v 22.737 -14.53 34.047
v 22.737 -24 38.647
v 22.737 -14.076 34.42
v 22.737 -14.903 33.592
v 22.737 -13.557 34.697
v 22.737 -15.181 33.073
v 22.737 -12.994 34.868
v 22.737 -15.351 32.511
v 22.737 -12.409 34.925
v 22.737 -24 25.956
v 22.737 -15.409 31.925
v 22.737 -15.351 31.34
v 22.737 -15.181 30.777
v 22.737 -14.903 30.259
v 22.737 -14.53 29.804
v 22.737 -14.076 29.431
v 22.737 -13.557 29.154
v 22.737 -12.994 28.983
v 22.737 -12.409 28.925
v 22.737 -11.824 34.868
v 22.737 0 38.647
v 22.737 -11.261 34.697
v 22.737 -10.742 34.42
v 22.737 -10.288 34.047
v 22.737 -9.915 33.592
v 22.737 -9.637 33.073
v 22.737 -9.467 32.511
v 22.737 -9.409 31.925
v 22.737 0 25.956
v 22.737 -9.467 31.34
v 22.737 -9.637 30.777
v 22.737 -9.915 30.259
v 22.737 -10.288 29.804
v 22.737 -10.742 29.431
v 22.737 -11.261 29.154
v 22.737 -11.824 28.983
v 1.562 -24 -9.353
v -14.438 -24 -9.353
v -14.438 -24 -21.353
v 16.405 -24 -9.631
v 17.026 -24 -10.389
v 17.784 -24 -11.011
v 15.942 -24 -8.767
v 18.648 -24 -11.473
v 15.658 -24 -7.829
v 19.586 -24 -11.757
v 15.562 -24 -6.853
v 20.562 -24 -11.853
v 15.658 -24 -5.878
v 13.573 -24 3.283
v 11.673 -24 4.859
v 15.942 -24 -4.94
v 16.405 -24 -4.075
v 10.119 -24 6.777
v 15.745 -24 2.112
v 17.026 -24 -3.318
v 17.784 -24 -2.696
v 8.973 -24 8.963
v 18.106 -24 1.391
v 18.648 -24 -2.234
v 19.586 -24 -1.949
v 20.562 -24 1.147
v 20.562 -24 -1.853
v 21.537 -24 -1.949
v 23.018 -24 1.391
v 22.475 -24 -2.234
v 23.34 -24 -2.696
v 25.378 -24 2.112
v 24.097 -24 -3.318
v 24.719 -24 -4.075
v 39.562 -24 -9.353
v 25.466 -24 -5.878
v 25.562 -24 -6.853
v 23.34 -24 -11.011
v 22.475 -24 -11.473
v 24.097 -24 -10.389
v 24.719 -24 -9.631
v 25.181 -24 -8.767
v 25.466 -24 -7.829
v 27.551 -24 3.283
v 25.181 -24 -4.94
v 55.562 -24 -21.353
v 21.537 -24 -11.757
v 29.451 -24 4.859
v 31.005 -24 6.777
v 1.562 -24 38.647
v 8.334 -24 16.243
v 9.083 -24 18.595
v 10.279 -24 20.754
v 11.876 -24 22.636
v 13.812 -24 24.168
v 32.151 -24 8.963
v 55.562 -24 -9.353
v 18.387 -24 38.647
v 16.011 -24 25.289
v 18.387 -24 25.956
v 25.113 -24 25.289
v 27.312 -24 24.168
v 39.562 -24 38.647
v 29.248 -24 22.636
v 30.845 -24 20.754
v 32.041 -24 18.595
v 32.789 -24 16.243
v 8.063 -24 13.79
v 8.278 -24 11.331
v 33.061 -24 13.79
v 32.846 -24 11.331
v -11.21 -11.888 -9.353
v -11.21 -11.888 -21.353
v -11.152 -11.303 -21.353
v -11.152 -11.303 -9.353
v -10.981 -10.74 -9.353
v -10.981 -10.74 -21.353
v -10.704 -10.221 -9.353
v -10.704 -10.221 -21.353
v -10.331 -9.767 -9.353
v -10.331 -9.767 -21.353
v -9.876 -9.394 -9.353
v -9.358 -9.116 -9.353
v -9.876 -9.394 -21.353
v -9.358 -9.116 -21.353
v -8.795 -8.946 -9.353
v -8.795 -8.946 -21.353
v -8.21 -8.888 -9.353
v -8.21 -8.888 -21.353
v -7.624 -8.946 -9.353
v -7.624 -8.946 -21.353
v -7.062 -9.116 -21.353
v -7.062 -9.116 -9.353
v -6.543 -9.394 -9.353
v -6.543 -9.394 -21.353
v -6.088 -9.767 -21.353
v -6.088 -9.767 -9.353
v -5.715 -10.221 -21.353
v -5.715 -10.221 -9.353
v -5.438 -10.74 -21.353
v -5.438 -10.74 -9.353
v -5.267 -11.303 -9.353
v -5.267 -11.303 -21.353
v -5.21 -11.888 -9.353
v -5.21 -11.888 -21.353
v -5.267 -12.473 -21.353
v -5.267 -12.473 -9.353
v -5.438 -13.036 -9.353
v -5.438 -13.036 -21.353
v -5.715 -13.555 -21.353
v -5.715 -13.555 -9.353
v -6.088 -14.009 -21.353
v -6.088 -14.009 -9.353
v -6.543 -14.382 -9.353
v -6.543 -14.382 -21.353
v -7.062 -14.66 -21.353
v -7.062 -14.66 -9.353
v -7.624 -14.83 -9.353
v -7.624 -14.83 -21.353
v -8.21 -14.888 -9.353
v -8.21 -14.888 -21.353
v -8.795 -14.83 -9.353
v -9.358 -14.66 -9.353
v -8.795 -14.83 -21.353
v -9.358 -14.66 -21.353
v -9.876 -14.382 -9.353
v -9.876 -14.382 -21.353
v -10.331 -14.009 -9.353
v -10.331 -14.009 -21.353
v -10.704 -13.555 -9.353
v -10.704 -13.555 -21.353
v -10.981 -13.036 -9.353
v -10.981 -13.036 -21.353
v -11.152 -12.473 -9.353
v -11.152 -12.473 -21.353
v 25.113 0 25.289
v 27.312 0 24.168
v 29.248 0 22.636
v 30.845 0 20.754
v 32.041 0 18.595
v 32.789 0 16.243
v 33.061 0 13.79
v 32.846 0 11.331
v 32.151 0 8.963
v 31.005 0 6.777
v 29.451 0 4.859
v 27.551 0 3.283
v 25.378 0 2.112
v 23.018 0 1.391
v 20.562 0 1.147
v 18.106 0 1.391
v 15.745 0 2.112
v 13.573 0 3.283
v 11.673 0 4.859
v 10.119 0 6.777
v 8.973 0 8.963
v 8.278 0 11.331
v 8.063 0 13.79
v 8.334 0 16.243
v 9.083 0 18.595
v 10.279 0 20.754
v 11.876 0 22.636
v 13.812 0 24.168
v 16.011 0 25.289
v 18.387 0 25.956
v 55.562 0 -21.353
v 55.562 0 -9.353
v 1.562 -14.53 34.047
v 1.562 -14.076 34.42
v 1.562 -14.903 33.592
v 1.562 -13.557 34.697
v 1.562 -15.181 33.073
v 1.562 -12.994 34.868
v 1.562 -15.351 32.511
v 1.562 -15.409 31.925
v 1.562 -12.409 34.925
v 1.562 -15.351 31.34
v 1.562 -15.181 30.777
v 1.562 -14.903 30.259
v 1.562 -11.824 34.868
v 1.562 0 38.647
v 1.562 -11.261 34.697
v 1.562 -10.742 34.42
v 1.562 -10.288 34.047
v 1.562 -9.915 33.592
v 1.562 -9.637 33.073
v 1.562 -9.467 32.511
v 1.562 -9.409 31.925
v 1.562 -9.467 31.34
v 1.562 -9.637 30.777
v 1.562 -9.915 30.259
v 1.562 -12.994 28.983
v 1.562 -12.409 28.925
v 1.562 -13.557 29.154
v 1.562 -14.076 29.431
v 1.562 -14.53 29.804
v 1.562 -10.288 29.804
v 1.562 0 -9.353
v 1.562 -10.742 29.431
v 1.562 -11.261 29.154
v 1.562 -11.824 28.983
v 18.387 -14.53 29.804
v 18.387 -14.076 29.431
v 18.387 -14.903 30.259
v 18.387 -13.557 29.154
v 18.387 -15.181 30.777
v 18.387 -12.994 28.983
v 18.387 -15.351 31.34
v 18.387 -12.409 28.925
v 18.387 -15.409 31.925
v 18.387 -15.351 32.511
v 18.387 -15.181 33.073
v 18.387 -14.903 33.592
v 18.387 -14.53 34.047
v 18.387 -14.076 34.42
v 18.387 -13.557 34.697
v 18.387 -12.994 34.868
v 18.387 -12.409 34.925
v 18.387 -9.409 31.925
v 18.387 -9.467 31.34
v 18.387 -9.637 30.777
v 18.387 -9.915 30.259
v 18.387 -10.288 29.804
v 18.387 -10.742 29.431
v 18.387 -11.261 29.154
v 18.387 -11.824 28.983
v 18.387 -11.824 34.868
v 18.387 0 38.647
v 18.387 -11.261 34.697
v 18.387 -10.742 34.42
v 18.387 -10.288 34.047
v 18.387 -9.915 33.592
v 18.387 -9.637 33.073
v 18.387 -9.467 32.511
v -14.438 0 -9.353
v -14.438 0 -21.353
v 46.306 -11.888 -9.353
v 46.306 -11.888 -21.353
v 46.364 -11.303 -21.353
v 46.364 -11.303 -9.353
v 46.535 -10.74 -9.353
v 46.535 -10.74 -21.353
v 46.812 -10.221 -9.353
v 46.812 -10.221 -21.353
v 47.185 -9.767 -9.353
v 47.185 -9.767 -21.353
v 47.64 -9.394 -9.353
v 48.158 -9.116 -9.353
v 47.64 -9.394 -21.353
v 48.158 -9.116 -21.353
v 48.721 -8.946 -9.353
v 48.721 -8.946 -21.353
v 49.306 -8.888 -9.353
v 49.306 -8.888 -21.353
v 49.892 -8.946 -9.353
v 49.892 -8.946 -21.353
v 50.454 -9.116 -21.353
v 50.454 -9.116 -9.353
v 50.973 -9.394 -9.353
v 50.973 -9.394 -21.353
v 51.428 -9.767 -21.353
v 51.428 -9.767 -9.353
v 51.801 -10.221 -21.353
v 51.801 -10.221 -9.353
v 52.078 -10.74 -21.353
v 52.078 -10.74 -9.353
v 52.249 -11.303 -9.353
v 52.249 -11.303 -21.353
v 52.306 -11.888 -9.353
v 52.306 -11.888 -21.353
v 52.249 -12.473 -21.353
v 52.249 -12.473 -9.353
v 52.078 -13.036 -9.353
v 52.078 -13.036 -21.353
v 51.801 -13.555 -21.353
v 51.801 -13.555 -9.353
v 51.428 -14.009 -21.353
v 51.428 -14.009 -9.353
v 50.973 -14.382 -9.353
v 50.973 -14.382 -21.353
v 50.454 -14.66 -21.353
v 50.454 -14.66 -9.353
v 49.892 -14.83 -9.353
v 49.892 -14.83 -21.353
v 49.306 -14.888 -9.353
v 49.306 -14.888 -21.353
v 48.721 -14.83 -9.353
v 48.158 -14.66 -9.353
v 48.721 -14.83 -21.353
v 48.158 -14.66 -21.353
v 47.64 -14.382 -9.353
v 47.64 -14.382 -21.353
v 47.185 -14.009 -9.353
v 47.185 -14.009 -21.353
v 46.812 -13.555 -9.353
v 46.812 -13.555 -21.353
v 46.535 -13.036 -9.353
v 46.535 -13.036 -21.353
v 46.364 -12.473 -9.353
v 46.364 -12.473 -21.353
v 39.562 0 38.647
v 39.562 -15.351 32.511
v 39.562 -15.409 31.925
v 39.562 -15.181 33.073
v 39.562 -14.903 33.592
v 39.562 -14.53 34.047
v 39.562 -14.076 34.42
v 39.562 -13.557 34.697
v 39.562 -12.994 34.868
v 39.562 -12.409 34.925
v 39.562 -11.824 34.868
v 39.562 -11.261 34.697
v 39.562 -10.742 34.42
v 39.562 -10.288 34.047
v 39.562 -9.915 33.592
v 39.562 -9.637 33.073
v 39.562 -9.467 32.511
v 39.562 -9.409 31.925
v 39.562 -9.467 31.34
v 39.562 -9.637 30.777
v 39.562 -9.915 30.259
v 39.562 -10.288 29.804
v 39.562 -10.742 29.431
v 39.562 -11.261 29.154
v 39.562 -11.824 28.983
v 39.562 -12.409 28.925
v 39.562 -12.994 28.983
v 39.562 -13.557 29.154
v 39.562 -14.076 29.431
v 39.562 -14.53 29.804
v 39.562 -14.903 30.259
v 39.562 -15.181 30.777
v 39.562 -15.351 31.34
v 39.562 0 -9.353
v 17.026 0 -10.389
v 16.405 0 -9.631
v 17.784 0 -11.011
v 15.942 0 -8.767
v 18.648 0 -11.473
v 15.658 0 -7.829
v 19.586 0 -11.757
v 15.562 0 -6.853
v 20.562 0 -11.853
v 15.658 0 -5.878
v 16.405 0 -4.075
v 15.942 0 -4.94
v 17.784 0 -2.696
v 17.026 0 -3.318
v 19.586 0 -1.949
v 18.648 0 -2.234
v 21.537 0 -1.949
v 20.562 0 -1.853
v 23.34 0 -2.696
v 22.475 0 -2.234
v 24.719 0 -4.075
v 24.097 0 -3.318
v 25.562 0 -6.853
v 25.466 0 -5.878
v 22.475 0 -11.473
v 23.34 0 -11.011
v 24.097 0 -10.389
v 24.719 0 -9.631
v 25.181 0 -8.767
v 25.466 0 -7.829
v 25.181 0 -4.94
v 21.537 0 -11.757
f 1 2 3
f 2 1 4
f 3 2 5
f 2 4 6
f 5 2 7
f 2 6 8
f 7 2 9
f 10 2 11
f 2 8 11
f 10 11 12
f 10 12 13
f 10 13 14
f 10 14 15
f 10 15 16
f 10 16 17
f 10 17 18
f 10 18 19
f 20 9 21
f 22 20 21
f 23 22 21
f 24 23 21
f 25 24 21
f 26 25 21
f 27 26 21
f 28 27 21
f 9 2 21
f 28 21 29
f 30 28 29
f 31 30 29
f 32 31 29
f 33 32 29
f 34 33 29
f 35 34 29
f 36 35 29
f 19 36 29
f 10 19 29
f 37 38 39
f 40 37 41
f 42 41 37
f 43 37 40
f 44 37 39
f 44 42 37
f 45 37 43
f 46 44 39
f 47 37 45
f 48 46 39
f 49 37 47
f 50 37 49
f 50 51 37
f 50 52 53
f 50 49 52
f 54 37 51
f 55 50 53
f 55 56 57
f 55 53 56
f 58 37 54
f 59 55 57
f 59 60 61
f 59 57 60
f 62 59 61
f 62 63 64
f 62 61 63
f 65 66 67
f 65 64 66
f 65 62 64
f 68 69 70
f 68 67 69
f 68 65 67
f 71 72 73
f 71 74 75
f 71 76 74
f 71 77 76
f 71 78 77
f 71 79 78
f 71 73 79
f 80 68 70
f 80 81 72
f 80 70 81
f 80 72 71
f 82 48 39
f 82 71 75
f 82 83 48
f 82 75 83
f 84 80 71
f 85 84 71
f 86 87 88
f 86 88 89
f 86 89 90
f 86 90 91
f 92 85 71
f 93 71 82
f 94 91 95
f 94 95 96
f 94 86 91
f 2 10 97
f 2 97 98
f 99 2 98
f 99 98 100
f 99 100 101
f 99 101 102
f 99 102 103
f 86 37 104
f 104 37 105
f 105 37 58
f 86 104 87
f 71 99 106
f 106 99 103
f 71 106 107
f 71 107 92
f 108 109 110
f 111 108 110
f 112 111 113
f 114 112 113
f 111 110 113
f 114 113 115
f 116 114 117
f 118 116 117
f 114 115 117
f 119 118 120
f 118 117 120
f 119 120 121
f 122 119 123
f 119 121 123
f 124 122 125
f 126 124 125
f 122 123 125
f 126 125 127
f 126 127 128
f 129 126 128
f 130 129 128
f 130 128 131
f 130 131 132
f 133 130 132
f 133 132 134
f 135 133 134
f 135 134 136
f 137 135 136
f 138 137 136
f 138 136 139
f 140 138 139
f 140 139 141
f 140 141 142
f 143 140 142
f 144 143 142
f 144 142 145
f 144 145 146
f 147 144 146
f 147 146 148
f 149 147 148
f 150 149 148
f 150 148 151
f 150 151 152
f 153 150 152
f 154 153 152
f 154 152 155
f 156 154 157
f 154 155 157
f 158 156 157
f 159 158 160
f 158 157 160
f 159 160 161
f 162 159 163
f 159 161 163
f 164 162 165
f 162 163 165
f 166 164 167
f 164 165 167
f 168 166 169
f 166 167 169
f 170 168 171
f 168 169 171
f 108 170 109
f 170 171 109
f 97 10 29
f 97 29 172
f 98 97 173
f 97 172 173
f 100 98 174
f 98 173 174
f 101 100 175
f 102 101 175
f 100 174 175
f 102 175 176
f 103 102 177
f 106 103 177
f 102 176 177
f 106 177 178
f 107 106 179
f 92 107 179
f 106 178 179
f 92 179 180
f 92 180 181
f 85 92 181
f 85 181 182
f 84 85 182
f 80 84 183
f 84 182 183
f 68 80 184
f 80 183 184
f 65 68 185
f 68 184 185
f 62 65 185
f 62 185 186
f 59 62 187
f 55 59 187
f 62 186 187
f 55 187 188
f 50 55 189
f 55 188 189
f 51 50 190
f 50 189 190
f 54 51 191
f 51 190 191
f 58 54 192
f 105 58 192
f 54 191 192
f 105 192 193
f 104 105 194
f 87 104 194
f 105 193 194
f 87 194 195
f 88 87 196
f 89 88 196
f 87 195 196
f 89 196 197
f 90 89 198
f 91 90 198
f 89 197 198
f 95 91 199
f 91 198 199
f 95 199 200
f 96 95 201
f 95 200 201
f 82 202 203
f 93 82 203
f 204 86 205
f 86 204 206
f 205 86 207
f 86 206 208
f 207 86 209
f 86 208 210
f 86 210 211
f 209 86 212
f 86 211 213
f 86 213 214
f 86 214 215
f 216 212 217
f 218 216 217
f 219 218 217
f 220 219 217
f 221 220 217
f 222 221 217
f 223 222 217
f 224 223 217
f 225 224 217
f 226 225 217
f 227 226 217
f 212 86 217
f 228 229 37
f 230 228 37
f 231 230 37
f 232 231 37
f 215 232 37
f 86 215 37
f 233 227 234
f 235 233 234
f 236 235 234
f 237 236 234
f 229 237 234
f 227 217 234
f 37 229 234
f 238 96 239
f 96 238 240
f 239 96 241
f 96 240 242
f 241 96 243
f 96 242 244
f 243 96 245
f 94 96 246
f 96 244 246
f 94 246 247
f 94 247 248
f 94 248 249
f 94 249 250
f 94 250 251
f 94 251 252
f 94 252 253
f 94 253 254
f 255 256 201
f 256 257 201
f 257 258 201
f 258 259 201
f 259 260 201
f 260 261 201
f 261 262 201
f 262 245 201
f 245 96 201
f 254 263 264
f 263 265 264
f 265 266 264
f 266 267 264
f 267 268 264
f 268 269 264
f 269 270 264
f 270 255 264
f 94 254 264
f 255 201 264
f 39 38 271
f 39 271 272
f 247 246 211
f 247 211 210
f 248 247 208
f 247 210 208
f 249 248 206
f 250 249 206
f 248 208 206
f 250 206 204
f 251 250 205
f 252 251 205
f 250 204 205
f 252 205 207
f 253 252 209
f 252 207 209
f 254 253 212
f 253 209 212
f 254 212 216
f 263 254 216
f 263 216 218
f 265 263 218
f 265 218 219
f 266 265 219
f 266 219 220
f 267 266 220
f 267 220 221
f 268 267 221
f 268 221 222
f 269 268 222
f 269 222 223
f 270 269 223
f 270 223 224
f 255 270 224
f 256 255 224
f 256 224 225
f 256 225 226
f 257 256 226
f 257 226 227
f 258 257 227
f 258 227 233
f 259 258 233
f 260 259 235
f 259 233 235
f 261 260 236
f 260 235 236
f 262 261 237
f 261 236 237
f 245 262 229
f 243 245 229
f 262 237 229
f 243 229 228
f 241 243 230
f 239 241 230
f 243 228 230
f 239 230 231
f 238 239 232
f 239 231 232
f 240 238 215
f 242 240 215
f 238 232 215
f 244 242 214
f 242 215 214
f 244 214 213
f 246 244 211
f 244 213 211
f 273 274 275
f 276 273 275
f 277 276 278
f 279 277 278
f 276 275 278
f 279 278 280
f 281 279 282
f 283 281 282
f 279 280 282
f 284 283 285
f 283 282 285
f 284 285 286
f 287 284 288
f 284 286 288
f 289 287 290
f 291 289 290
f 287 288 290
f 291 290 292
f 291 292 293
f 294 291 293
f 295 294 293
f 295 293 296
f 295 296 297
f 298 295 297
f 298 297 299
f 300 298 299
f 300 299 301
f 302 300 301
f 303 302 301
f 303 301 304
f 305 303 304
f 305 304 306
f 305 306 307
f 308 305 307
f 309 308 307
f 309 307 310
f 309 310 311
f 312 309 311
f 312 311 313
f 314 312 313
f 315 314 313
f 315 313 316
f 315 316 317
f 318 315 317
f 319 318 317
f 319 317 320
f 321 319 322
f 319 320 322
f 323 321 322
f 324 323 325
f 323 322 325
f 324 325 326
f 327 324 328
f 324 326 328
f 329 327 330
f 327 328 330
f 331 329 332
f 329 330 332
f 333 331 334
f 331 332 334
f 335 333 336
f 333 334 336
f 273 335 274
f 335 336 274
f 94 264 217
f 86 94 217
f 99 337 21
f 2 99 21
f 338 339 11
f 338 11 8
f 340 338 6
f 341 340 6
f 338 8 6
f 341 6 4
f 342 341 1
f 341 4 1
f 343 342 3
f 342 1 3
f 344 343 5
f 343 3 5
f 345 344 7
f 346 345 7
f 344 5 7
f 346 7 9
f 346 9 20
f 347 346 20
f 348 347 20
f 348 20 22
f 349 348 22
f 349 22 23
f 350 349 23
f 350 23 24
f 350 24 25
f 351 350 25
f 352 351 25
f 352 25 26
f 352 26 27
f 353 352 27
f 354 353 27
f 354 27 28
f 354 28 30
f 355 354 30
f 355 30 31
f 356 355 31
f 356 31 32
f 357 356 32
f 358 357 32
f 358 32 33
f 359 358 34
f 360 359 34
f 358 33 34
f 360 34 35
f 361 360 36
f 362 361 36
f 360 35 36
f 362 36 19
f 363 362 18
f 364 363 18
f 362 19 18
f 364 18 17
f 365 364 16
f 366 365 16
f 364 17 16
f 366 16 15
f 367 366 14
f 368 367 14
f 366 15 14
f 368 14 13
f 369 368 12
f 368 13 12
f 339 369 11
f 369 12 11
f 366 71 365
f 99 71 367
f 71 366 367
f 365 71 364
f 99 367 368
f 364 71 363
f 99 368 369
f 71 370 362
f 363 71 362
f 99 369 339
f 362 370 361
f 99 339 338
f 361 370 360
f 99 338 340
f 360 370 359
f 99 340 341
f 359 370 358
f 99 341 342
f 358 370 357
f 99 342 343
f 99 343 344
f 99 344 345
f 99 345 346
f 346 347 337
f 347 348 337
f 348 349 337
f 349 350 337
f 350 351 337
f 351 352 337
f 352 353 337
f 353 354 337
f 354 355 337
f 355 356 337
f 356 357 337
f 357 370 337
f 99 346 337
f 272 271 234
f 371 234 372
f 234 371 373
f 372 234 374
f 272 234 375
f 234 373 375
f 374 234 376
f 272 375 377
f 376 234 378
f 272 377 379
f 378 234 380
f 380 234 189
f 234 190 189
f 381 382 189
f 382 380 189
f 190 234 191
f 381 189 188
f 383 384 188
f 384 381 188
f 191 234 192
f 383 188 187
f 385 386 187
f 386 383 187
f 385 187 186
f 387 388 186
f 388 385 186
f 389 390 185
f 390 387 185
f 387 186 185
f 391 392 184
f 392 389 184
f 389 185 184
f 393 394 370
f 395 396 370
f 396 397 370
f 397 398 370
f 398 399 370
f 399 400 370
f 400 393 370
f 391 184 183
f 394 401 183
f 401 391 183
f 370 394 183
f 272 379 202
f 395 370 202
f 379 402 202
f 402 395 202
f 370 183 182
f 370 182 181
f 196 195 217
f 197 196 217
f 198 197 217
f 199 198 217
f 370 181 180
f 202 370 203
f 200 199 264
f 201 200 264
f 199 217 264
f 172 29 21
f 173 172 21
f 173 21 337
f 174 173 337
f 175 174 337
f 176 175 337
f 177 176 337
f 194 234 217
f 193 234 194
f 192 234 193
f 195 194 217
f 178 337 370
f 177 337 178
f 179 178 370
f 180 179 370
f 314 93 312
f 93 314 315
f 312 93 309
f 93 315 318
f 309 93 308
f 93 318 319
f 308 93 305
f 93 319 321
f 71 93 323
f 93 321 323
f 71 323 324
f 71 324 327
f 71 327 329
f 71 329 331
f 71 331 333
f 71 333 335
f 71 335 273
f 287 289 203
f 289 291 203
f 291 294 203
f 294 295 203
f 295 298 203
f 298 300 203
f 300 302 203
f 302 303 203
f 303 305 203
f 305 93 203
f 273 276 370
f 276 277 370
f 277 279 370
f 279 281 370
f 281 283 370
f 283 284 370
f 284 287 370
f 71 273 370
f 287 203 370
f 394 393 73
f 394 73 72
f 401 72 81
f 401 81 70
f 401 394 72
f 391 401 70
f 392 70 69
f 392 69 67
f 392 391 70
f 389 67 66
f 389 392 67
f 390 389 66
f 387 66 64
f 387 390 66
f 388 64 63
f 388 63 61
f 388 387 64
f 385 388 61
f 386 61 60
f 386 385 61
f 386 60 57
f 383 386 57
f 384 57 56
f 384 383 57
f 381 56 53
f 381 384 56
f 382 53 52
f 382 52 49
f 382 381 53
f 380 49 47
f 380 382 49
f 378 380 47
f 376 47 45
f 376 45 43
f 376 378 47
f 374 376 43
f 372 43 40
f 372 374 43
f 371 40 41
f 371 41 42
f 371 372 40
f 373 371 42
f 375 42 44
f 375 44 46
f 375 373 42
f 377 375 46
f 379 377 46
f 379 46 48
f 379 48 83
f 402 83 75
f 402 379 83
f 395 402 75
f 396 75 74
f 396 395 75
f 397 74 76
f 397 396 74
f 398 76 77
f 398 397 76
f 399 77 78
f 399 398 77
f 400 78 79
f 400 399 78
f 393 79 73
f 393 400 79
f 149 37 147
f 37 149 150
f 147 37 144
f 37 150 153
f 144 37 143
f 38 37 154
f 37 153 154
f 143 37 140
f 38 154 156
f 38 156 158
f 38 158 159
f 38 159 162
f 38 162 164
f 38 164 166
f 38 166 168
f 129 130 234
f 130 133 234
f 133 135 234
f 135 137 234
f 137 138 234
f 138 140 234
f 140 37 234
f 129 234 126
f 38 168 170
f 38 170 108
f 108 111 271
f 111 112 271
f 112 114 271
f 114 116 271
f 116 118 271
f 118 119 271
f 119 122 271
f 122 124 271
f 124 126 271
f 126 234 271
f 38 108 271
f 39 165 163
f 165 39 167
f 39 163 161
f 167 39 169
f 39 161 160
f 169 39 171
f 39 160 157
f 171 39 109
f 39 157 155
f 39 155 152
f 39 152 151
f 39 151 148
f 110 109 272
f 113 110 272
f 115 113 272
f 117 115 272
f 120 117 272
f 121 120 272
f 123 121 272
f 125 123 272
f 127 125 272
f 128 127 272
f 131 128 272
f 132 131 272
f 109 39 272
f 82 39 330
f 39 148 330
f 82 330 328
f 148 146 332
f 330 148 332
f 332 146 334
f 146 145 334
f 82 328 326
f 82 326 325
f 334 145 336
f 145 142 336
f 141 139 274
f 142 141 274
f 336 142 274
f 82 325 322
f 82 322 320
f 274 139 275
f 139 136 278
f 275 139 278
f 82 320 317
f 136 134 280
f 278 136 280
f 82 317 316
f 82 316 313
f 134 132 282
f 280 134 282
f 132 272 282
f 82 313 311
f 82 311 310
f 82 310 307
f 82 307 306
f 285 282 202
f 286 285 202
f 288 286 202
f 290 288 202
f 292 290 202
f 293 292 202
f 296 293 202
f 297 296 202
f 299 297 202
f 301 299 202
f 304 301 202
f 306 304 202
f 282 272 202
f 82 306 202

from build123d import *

# Parameters (mm, degrees)
F0_R     = 5
F1_DEPTH = 24
F3_D     = 6
F5_D     = 6


with BuildPart() as f1:
    # F0 (on Front) → F1 (new body)
    with BuildSketch(Plane.XZ):
        with BuildLine():
            Line((18.38709, 38.646828), (1.561872, 38.646828))
            Line((1.561872, 38.646828), (1.561872, -9.353172))
            Line((1.561872, -9.353172), (-14.438128, -9.353172))
            Line((-14.438128, -9.353172), (-14.438128, -21.353172))
            Line((-14.438128, -21.353172), (1.561872, -21.353172))
            Line((1.561872, -21.353172), (39.561872, -21.353172))
            Line((39.561872, -21.353172), (55.561872, -21.353172))
            Line((55.561872, -21.353172), (55.561872, -9.353172))
            Line((55.561872, -9.353172), (39.561872, -9.353172))
            Line((39.561872, -9.353172), (39.561872, 38.646828))
            Line((39.561872, 38.646828), (22.736653, 38.646828))
            Line((22.736653, 38.646828), (22.736653, 25.956187))
            ThreePointArc((22.736653, 25.956187), (20.561872, 1.146828), (18.38709, 25.956187))
            Line((18.38709, 25.956187), (18.38709, 38.646828))
        make_face()
        with Locations((20.561872, -6.853172)):
            Circle(F0_R, mode=Mode.SUBTRACT)
    extrude(amount=F1_DEPTH)

    # F3 (through all)
    with Locations(Plane.YZ.offset(39.561872)):
        with Locations((-12.408947, 31.925292)):
            Hole(F3_D / 2)

    # F5 (through all)
    with Locations(Plane.XY.offset(-9.353172)):
        with Locations((-8.209684, -11.887997), (49.306241, -11.887997)):
            Hole(F5_D / 2)


solid = f1.part
